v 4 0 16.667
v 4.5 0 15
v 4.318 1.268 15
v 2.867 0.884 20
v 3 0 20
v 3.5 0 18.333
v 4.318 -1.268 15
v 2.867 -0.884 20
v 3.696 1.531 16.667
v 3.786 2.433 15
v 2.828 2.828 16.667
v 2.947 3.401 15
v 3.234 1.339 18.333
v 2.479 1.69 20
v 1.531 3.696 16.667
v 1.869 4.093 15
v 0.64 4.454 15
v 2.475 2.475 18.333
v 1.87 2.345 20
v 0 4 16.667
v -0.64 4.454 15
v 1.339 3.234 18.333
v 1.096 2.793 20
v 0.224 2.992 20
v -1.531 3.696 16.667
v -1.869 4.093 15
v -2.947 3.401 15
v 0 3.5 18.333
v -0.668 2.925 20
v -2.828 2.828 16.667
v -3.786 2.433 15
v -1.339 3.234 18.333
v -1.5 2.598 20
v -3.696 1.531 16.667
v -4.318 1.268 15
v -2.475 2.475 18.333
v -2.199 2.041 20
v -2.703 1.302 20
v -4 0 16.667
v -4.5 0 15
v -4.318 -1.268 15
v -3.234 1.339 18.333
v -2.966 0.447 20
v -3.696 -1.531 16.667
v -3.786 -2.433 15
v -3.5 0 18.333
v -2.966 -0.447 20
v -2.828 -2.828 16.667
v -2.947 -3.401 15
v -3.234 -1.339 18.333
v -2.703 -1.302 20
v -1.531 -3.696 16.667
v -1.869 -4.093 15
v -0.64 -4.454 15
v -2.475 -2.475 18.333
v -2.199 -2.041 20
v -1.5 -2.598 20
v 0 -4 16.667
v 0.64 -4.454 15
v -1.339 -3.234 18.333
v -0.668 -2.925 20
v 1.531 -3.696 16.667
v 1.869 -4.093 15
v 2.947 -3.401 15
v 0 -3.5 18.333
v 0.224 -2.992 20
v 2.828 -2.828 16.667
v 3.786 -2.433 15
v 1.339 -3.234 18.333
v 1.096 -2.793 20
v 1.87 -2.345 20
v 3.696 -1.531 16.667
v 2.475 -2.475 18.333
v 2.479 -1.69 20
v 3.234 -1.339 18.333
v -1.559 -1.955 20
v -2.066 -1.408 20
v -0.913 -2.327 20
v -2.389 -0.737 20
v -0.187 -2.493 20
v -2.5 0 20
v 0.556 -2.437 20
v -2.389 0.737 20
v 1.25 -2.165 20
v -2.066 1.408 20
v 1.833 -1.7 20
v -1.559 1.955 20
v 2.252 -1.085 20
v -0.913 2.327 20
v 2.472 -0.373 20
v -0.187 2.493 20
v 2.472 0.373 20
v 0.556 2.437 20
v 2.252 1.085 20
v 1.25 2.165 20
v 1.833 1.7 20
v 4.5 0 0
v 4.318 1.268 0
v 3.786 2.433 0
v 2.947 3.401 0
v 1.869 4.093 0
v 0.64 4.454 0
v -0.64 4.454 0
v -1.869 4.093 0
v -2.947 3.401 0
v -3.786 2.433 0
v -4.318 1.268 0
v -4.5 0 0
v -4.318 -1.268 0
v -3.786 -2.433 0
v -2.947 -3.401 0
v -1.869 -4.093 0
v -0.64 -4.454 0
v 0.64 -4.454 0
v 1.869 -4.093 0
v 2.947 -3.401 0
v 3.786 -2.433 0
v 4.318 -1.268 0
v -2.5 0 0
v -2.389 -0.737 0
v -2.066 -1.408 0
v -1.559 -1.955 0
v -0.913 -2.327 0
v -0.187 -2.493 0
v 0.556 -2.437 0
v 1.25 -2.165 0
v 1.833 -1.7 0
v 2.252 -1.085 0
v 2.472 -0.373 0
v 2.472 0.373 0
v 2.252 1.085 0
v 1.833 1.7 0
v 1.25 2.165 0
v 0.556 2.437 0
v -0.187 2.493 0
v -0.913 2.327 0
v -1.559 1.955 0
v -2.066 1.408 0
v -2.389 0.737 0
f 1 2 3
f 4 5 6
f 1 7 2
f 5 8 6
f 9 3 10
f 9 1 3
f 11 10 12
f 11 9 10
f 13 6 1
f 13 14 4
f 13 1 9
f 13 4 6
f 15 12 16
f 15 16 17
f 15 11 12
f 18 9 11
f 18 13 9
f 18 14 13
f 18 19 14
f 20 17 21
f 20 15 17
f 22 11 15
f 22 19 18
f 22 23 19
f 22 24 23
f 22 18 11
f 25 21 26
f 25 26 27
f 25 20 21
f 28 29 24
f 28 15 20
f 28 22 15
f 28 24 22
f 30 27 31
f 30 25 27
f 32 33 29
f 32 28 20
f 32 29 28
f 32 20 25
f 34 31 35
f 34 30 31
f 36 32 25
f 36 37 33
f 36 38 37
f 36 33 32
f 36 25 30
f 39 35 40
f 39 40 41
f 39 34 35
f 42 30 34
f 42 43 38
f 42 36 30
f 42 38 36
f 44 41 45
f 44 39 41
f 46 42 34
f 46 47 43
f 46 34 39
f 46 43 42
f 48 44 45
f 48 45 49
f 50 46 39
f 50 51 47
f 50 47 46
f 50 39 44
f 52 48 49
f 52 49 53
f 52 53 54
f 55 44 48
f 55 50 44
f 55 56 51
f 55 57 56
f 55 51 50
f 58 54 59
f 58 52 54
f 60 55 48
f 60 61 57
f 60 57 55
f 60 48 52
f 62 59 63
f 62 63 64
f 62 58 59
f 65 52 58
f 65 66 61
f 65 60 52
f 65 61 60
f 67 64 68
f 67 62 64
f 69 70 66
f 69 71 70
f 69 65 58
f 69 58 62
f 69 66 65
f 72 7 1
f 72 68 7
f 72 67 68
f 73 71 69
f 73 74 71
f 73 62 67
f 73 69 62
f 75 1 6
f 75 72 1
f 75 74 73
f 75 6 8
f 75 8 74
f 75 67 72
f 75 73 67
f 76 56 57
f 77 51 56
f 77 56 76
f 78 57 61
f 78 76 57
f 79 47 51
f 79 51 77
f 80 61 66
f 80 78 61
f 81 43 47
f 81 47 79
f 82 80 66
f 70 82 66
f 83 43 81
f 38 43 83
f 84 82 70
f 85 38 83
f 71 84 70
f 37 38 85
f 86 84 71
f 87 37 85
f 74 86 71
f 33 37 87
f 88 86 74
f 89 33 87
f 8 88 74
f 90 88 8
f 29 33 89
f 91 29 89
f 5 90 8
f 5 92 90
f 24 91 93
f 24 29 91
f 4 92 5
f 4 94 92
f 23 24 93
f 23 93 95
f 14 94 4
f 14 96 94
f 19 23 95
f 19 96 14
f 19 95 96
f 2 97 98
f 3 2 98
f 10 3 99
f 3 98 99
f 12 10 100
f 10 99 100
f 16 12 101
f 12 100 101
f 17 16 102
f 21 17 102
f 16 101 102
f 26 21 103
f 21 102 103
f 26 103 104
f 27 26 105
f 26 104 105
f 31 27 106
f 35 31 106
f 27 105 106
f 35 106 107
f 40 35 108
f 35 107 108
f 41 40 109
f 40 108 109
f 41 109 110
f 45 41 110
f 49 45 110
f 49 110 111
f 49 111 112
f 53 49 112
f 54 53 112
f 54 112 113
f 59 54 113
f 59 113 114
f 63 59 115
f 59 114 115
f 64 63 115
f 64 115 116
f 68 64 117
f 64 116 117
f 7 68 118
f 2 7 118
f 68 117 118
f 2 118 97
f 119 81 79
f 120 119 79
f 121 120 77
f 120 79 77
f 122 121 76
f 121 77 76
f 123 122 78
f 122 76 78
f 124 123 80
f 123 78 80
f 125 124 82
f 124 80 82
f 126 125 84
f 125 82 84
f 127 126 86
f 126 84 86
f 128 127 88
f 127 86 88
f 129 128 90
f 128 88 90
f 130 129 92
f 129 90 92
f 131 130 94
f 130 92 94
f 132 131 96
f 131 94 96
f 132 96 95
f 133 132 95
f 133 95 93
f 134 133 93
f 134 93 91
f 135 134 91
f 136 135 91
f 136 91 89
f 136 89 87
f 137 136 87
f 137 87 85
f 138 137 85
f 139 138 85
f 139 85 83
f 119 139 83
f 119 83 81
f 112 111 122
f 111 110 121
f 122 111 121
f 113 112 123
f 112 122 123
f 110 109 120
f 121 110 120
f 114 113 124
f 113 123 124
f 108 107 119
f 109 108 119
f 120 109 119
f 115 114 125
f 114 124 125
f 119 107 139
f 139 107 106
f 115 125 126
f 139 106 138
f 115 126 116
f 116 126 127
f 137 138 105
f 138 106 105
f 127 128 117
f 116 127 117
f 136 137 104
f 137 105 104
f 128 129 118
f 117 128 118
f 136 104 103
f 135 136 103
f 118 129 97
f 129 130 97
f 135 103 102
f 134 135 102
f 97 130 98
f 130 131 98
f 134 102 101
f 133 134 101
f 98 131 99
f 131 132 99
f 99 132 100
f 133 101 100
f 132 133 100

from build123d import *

# Parameters (mm, degrees)
F0_R     = 4.5
F1_DEPTH = 20
F2_SIZE2 = 1.5
F2_SIZE  = 5
F3_D     = 5


with BuildPart() as f1:
    # F0 (on Top) → F1 (new body)
    with BuildSketch(Plane.XY):
        Circle(F0_R)
    extrude(amount=F1_DEPTH)

    # F2
    f2_edges = [f1.edges().sort_by_distance(p)[0] for p in [
        (-4.5, 0, 20),
    ]]
    f2_side = f1.faces().sort_by_distance((-4.5, 0, 10))[0]
    chamfer(f2_edges, length=F2_SIZE, length2=F2_SIZE2, reference=f2_side)

    # F3 (through all)
    with Locations(Plane(origin=(0, 0, 0), x_dir=(1, 0, 0), z_dir=(0, 0, -1))):
        with Locations((0, 0)):
            Hole(F3_D / 2)


solid = f1.part
